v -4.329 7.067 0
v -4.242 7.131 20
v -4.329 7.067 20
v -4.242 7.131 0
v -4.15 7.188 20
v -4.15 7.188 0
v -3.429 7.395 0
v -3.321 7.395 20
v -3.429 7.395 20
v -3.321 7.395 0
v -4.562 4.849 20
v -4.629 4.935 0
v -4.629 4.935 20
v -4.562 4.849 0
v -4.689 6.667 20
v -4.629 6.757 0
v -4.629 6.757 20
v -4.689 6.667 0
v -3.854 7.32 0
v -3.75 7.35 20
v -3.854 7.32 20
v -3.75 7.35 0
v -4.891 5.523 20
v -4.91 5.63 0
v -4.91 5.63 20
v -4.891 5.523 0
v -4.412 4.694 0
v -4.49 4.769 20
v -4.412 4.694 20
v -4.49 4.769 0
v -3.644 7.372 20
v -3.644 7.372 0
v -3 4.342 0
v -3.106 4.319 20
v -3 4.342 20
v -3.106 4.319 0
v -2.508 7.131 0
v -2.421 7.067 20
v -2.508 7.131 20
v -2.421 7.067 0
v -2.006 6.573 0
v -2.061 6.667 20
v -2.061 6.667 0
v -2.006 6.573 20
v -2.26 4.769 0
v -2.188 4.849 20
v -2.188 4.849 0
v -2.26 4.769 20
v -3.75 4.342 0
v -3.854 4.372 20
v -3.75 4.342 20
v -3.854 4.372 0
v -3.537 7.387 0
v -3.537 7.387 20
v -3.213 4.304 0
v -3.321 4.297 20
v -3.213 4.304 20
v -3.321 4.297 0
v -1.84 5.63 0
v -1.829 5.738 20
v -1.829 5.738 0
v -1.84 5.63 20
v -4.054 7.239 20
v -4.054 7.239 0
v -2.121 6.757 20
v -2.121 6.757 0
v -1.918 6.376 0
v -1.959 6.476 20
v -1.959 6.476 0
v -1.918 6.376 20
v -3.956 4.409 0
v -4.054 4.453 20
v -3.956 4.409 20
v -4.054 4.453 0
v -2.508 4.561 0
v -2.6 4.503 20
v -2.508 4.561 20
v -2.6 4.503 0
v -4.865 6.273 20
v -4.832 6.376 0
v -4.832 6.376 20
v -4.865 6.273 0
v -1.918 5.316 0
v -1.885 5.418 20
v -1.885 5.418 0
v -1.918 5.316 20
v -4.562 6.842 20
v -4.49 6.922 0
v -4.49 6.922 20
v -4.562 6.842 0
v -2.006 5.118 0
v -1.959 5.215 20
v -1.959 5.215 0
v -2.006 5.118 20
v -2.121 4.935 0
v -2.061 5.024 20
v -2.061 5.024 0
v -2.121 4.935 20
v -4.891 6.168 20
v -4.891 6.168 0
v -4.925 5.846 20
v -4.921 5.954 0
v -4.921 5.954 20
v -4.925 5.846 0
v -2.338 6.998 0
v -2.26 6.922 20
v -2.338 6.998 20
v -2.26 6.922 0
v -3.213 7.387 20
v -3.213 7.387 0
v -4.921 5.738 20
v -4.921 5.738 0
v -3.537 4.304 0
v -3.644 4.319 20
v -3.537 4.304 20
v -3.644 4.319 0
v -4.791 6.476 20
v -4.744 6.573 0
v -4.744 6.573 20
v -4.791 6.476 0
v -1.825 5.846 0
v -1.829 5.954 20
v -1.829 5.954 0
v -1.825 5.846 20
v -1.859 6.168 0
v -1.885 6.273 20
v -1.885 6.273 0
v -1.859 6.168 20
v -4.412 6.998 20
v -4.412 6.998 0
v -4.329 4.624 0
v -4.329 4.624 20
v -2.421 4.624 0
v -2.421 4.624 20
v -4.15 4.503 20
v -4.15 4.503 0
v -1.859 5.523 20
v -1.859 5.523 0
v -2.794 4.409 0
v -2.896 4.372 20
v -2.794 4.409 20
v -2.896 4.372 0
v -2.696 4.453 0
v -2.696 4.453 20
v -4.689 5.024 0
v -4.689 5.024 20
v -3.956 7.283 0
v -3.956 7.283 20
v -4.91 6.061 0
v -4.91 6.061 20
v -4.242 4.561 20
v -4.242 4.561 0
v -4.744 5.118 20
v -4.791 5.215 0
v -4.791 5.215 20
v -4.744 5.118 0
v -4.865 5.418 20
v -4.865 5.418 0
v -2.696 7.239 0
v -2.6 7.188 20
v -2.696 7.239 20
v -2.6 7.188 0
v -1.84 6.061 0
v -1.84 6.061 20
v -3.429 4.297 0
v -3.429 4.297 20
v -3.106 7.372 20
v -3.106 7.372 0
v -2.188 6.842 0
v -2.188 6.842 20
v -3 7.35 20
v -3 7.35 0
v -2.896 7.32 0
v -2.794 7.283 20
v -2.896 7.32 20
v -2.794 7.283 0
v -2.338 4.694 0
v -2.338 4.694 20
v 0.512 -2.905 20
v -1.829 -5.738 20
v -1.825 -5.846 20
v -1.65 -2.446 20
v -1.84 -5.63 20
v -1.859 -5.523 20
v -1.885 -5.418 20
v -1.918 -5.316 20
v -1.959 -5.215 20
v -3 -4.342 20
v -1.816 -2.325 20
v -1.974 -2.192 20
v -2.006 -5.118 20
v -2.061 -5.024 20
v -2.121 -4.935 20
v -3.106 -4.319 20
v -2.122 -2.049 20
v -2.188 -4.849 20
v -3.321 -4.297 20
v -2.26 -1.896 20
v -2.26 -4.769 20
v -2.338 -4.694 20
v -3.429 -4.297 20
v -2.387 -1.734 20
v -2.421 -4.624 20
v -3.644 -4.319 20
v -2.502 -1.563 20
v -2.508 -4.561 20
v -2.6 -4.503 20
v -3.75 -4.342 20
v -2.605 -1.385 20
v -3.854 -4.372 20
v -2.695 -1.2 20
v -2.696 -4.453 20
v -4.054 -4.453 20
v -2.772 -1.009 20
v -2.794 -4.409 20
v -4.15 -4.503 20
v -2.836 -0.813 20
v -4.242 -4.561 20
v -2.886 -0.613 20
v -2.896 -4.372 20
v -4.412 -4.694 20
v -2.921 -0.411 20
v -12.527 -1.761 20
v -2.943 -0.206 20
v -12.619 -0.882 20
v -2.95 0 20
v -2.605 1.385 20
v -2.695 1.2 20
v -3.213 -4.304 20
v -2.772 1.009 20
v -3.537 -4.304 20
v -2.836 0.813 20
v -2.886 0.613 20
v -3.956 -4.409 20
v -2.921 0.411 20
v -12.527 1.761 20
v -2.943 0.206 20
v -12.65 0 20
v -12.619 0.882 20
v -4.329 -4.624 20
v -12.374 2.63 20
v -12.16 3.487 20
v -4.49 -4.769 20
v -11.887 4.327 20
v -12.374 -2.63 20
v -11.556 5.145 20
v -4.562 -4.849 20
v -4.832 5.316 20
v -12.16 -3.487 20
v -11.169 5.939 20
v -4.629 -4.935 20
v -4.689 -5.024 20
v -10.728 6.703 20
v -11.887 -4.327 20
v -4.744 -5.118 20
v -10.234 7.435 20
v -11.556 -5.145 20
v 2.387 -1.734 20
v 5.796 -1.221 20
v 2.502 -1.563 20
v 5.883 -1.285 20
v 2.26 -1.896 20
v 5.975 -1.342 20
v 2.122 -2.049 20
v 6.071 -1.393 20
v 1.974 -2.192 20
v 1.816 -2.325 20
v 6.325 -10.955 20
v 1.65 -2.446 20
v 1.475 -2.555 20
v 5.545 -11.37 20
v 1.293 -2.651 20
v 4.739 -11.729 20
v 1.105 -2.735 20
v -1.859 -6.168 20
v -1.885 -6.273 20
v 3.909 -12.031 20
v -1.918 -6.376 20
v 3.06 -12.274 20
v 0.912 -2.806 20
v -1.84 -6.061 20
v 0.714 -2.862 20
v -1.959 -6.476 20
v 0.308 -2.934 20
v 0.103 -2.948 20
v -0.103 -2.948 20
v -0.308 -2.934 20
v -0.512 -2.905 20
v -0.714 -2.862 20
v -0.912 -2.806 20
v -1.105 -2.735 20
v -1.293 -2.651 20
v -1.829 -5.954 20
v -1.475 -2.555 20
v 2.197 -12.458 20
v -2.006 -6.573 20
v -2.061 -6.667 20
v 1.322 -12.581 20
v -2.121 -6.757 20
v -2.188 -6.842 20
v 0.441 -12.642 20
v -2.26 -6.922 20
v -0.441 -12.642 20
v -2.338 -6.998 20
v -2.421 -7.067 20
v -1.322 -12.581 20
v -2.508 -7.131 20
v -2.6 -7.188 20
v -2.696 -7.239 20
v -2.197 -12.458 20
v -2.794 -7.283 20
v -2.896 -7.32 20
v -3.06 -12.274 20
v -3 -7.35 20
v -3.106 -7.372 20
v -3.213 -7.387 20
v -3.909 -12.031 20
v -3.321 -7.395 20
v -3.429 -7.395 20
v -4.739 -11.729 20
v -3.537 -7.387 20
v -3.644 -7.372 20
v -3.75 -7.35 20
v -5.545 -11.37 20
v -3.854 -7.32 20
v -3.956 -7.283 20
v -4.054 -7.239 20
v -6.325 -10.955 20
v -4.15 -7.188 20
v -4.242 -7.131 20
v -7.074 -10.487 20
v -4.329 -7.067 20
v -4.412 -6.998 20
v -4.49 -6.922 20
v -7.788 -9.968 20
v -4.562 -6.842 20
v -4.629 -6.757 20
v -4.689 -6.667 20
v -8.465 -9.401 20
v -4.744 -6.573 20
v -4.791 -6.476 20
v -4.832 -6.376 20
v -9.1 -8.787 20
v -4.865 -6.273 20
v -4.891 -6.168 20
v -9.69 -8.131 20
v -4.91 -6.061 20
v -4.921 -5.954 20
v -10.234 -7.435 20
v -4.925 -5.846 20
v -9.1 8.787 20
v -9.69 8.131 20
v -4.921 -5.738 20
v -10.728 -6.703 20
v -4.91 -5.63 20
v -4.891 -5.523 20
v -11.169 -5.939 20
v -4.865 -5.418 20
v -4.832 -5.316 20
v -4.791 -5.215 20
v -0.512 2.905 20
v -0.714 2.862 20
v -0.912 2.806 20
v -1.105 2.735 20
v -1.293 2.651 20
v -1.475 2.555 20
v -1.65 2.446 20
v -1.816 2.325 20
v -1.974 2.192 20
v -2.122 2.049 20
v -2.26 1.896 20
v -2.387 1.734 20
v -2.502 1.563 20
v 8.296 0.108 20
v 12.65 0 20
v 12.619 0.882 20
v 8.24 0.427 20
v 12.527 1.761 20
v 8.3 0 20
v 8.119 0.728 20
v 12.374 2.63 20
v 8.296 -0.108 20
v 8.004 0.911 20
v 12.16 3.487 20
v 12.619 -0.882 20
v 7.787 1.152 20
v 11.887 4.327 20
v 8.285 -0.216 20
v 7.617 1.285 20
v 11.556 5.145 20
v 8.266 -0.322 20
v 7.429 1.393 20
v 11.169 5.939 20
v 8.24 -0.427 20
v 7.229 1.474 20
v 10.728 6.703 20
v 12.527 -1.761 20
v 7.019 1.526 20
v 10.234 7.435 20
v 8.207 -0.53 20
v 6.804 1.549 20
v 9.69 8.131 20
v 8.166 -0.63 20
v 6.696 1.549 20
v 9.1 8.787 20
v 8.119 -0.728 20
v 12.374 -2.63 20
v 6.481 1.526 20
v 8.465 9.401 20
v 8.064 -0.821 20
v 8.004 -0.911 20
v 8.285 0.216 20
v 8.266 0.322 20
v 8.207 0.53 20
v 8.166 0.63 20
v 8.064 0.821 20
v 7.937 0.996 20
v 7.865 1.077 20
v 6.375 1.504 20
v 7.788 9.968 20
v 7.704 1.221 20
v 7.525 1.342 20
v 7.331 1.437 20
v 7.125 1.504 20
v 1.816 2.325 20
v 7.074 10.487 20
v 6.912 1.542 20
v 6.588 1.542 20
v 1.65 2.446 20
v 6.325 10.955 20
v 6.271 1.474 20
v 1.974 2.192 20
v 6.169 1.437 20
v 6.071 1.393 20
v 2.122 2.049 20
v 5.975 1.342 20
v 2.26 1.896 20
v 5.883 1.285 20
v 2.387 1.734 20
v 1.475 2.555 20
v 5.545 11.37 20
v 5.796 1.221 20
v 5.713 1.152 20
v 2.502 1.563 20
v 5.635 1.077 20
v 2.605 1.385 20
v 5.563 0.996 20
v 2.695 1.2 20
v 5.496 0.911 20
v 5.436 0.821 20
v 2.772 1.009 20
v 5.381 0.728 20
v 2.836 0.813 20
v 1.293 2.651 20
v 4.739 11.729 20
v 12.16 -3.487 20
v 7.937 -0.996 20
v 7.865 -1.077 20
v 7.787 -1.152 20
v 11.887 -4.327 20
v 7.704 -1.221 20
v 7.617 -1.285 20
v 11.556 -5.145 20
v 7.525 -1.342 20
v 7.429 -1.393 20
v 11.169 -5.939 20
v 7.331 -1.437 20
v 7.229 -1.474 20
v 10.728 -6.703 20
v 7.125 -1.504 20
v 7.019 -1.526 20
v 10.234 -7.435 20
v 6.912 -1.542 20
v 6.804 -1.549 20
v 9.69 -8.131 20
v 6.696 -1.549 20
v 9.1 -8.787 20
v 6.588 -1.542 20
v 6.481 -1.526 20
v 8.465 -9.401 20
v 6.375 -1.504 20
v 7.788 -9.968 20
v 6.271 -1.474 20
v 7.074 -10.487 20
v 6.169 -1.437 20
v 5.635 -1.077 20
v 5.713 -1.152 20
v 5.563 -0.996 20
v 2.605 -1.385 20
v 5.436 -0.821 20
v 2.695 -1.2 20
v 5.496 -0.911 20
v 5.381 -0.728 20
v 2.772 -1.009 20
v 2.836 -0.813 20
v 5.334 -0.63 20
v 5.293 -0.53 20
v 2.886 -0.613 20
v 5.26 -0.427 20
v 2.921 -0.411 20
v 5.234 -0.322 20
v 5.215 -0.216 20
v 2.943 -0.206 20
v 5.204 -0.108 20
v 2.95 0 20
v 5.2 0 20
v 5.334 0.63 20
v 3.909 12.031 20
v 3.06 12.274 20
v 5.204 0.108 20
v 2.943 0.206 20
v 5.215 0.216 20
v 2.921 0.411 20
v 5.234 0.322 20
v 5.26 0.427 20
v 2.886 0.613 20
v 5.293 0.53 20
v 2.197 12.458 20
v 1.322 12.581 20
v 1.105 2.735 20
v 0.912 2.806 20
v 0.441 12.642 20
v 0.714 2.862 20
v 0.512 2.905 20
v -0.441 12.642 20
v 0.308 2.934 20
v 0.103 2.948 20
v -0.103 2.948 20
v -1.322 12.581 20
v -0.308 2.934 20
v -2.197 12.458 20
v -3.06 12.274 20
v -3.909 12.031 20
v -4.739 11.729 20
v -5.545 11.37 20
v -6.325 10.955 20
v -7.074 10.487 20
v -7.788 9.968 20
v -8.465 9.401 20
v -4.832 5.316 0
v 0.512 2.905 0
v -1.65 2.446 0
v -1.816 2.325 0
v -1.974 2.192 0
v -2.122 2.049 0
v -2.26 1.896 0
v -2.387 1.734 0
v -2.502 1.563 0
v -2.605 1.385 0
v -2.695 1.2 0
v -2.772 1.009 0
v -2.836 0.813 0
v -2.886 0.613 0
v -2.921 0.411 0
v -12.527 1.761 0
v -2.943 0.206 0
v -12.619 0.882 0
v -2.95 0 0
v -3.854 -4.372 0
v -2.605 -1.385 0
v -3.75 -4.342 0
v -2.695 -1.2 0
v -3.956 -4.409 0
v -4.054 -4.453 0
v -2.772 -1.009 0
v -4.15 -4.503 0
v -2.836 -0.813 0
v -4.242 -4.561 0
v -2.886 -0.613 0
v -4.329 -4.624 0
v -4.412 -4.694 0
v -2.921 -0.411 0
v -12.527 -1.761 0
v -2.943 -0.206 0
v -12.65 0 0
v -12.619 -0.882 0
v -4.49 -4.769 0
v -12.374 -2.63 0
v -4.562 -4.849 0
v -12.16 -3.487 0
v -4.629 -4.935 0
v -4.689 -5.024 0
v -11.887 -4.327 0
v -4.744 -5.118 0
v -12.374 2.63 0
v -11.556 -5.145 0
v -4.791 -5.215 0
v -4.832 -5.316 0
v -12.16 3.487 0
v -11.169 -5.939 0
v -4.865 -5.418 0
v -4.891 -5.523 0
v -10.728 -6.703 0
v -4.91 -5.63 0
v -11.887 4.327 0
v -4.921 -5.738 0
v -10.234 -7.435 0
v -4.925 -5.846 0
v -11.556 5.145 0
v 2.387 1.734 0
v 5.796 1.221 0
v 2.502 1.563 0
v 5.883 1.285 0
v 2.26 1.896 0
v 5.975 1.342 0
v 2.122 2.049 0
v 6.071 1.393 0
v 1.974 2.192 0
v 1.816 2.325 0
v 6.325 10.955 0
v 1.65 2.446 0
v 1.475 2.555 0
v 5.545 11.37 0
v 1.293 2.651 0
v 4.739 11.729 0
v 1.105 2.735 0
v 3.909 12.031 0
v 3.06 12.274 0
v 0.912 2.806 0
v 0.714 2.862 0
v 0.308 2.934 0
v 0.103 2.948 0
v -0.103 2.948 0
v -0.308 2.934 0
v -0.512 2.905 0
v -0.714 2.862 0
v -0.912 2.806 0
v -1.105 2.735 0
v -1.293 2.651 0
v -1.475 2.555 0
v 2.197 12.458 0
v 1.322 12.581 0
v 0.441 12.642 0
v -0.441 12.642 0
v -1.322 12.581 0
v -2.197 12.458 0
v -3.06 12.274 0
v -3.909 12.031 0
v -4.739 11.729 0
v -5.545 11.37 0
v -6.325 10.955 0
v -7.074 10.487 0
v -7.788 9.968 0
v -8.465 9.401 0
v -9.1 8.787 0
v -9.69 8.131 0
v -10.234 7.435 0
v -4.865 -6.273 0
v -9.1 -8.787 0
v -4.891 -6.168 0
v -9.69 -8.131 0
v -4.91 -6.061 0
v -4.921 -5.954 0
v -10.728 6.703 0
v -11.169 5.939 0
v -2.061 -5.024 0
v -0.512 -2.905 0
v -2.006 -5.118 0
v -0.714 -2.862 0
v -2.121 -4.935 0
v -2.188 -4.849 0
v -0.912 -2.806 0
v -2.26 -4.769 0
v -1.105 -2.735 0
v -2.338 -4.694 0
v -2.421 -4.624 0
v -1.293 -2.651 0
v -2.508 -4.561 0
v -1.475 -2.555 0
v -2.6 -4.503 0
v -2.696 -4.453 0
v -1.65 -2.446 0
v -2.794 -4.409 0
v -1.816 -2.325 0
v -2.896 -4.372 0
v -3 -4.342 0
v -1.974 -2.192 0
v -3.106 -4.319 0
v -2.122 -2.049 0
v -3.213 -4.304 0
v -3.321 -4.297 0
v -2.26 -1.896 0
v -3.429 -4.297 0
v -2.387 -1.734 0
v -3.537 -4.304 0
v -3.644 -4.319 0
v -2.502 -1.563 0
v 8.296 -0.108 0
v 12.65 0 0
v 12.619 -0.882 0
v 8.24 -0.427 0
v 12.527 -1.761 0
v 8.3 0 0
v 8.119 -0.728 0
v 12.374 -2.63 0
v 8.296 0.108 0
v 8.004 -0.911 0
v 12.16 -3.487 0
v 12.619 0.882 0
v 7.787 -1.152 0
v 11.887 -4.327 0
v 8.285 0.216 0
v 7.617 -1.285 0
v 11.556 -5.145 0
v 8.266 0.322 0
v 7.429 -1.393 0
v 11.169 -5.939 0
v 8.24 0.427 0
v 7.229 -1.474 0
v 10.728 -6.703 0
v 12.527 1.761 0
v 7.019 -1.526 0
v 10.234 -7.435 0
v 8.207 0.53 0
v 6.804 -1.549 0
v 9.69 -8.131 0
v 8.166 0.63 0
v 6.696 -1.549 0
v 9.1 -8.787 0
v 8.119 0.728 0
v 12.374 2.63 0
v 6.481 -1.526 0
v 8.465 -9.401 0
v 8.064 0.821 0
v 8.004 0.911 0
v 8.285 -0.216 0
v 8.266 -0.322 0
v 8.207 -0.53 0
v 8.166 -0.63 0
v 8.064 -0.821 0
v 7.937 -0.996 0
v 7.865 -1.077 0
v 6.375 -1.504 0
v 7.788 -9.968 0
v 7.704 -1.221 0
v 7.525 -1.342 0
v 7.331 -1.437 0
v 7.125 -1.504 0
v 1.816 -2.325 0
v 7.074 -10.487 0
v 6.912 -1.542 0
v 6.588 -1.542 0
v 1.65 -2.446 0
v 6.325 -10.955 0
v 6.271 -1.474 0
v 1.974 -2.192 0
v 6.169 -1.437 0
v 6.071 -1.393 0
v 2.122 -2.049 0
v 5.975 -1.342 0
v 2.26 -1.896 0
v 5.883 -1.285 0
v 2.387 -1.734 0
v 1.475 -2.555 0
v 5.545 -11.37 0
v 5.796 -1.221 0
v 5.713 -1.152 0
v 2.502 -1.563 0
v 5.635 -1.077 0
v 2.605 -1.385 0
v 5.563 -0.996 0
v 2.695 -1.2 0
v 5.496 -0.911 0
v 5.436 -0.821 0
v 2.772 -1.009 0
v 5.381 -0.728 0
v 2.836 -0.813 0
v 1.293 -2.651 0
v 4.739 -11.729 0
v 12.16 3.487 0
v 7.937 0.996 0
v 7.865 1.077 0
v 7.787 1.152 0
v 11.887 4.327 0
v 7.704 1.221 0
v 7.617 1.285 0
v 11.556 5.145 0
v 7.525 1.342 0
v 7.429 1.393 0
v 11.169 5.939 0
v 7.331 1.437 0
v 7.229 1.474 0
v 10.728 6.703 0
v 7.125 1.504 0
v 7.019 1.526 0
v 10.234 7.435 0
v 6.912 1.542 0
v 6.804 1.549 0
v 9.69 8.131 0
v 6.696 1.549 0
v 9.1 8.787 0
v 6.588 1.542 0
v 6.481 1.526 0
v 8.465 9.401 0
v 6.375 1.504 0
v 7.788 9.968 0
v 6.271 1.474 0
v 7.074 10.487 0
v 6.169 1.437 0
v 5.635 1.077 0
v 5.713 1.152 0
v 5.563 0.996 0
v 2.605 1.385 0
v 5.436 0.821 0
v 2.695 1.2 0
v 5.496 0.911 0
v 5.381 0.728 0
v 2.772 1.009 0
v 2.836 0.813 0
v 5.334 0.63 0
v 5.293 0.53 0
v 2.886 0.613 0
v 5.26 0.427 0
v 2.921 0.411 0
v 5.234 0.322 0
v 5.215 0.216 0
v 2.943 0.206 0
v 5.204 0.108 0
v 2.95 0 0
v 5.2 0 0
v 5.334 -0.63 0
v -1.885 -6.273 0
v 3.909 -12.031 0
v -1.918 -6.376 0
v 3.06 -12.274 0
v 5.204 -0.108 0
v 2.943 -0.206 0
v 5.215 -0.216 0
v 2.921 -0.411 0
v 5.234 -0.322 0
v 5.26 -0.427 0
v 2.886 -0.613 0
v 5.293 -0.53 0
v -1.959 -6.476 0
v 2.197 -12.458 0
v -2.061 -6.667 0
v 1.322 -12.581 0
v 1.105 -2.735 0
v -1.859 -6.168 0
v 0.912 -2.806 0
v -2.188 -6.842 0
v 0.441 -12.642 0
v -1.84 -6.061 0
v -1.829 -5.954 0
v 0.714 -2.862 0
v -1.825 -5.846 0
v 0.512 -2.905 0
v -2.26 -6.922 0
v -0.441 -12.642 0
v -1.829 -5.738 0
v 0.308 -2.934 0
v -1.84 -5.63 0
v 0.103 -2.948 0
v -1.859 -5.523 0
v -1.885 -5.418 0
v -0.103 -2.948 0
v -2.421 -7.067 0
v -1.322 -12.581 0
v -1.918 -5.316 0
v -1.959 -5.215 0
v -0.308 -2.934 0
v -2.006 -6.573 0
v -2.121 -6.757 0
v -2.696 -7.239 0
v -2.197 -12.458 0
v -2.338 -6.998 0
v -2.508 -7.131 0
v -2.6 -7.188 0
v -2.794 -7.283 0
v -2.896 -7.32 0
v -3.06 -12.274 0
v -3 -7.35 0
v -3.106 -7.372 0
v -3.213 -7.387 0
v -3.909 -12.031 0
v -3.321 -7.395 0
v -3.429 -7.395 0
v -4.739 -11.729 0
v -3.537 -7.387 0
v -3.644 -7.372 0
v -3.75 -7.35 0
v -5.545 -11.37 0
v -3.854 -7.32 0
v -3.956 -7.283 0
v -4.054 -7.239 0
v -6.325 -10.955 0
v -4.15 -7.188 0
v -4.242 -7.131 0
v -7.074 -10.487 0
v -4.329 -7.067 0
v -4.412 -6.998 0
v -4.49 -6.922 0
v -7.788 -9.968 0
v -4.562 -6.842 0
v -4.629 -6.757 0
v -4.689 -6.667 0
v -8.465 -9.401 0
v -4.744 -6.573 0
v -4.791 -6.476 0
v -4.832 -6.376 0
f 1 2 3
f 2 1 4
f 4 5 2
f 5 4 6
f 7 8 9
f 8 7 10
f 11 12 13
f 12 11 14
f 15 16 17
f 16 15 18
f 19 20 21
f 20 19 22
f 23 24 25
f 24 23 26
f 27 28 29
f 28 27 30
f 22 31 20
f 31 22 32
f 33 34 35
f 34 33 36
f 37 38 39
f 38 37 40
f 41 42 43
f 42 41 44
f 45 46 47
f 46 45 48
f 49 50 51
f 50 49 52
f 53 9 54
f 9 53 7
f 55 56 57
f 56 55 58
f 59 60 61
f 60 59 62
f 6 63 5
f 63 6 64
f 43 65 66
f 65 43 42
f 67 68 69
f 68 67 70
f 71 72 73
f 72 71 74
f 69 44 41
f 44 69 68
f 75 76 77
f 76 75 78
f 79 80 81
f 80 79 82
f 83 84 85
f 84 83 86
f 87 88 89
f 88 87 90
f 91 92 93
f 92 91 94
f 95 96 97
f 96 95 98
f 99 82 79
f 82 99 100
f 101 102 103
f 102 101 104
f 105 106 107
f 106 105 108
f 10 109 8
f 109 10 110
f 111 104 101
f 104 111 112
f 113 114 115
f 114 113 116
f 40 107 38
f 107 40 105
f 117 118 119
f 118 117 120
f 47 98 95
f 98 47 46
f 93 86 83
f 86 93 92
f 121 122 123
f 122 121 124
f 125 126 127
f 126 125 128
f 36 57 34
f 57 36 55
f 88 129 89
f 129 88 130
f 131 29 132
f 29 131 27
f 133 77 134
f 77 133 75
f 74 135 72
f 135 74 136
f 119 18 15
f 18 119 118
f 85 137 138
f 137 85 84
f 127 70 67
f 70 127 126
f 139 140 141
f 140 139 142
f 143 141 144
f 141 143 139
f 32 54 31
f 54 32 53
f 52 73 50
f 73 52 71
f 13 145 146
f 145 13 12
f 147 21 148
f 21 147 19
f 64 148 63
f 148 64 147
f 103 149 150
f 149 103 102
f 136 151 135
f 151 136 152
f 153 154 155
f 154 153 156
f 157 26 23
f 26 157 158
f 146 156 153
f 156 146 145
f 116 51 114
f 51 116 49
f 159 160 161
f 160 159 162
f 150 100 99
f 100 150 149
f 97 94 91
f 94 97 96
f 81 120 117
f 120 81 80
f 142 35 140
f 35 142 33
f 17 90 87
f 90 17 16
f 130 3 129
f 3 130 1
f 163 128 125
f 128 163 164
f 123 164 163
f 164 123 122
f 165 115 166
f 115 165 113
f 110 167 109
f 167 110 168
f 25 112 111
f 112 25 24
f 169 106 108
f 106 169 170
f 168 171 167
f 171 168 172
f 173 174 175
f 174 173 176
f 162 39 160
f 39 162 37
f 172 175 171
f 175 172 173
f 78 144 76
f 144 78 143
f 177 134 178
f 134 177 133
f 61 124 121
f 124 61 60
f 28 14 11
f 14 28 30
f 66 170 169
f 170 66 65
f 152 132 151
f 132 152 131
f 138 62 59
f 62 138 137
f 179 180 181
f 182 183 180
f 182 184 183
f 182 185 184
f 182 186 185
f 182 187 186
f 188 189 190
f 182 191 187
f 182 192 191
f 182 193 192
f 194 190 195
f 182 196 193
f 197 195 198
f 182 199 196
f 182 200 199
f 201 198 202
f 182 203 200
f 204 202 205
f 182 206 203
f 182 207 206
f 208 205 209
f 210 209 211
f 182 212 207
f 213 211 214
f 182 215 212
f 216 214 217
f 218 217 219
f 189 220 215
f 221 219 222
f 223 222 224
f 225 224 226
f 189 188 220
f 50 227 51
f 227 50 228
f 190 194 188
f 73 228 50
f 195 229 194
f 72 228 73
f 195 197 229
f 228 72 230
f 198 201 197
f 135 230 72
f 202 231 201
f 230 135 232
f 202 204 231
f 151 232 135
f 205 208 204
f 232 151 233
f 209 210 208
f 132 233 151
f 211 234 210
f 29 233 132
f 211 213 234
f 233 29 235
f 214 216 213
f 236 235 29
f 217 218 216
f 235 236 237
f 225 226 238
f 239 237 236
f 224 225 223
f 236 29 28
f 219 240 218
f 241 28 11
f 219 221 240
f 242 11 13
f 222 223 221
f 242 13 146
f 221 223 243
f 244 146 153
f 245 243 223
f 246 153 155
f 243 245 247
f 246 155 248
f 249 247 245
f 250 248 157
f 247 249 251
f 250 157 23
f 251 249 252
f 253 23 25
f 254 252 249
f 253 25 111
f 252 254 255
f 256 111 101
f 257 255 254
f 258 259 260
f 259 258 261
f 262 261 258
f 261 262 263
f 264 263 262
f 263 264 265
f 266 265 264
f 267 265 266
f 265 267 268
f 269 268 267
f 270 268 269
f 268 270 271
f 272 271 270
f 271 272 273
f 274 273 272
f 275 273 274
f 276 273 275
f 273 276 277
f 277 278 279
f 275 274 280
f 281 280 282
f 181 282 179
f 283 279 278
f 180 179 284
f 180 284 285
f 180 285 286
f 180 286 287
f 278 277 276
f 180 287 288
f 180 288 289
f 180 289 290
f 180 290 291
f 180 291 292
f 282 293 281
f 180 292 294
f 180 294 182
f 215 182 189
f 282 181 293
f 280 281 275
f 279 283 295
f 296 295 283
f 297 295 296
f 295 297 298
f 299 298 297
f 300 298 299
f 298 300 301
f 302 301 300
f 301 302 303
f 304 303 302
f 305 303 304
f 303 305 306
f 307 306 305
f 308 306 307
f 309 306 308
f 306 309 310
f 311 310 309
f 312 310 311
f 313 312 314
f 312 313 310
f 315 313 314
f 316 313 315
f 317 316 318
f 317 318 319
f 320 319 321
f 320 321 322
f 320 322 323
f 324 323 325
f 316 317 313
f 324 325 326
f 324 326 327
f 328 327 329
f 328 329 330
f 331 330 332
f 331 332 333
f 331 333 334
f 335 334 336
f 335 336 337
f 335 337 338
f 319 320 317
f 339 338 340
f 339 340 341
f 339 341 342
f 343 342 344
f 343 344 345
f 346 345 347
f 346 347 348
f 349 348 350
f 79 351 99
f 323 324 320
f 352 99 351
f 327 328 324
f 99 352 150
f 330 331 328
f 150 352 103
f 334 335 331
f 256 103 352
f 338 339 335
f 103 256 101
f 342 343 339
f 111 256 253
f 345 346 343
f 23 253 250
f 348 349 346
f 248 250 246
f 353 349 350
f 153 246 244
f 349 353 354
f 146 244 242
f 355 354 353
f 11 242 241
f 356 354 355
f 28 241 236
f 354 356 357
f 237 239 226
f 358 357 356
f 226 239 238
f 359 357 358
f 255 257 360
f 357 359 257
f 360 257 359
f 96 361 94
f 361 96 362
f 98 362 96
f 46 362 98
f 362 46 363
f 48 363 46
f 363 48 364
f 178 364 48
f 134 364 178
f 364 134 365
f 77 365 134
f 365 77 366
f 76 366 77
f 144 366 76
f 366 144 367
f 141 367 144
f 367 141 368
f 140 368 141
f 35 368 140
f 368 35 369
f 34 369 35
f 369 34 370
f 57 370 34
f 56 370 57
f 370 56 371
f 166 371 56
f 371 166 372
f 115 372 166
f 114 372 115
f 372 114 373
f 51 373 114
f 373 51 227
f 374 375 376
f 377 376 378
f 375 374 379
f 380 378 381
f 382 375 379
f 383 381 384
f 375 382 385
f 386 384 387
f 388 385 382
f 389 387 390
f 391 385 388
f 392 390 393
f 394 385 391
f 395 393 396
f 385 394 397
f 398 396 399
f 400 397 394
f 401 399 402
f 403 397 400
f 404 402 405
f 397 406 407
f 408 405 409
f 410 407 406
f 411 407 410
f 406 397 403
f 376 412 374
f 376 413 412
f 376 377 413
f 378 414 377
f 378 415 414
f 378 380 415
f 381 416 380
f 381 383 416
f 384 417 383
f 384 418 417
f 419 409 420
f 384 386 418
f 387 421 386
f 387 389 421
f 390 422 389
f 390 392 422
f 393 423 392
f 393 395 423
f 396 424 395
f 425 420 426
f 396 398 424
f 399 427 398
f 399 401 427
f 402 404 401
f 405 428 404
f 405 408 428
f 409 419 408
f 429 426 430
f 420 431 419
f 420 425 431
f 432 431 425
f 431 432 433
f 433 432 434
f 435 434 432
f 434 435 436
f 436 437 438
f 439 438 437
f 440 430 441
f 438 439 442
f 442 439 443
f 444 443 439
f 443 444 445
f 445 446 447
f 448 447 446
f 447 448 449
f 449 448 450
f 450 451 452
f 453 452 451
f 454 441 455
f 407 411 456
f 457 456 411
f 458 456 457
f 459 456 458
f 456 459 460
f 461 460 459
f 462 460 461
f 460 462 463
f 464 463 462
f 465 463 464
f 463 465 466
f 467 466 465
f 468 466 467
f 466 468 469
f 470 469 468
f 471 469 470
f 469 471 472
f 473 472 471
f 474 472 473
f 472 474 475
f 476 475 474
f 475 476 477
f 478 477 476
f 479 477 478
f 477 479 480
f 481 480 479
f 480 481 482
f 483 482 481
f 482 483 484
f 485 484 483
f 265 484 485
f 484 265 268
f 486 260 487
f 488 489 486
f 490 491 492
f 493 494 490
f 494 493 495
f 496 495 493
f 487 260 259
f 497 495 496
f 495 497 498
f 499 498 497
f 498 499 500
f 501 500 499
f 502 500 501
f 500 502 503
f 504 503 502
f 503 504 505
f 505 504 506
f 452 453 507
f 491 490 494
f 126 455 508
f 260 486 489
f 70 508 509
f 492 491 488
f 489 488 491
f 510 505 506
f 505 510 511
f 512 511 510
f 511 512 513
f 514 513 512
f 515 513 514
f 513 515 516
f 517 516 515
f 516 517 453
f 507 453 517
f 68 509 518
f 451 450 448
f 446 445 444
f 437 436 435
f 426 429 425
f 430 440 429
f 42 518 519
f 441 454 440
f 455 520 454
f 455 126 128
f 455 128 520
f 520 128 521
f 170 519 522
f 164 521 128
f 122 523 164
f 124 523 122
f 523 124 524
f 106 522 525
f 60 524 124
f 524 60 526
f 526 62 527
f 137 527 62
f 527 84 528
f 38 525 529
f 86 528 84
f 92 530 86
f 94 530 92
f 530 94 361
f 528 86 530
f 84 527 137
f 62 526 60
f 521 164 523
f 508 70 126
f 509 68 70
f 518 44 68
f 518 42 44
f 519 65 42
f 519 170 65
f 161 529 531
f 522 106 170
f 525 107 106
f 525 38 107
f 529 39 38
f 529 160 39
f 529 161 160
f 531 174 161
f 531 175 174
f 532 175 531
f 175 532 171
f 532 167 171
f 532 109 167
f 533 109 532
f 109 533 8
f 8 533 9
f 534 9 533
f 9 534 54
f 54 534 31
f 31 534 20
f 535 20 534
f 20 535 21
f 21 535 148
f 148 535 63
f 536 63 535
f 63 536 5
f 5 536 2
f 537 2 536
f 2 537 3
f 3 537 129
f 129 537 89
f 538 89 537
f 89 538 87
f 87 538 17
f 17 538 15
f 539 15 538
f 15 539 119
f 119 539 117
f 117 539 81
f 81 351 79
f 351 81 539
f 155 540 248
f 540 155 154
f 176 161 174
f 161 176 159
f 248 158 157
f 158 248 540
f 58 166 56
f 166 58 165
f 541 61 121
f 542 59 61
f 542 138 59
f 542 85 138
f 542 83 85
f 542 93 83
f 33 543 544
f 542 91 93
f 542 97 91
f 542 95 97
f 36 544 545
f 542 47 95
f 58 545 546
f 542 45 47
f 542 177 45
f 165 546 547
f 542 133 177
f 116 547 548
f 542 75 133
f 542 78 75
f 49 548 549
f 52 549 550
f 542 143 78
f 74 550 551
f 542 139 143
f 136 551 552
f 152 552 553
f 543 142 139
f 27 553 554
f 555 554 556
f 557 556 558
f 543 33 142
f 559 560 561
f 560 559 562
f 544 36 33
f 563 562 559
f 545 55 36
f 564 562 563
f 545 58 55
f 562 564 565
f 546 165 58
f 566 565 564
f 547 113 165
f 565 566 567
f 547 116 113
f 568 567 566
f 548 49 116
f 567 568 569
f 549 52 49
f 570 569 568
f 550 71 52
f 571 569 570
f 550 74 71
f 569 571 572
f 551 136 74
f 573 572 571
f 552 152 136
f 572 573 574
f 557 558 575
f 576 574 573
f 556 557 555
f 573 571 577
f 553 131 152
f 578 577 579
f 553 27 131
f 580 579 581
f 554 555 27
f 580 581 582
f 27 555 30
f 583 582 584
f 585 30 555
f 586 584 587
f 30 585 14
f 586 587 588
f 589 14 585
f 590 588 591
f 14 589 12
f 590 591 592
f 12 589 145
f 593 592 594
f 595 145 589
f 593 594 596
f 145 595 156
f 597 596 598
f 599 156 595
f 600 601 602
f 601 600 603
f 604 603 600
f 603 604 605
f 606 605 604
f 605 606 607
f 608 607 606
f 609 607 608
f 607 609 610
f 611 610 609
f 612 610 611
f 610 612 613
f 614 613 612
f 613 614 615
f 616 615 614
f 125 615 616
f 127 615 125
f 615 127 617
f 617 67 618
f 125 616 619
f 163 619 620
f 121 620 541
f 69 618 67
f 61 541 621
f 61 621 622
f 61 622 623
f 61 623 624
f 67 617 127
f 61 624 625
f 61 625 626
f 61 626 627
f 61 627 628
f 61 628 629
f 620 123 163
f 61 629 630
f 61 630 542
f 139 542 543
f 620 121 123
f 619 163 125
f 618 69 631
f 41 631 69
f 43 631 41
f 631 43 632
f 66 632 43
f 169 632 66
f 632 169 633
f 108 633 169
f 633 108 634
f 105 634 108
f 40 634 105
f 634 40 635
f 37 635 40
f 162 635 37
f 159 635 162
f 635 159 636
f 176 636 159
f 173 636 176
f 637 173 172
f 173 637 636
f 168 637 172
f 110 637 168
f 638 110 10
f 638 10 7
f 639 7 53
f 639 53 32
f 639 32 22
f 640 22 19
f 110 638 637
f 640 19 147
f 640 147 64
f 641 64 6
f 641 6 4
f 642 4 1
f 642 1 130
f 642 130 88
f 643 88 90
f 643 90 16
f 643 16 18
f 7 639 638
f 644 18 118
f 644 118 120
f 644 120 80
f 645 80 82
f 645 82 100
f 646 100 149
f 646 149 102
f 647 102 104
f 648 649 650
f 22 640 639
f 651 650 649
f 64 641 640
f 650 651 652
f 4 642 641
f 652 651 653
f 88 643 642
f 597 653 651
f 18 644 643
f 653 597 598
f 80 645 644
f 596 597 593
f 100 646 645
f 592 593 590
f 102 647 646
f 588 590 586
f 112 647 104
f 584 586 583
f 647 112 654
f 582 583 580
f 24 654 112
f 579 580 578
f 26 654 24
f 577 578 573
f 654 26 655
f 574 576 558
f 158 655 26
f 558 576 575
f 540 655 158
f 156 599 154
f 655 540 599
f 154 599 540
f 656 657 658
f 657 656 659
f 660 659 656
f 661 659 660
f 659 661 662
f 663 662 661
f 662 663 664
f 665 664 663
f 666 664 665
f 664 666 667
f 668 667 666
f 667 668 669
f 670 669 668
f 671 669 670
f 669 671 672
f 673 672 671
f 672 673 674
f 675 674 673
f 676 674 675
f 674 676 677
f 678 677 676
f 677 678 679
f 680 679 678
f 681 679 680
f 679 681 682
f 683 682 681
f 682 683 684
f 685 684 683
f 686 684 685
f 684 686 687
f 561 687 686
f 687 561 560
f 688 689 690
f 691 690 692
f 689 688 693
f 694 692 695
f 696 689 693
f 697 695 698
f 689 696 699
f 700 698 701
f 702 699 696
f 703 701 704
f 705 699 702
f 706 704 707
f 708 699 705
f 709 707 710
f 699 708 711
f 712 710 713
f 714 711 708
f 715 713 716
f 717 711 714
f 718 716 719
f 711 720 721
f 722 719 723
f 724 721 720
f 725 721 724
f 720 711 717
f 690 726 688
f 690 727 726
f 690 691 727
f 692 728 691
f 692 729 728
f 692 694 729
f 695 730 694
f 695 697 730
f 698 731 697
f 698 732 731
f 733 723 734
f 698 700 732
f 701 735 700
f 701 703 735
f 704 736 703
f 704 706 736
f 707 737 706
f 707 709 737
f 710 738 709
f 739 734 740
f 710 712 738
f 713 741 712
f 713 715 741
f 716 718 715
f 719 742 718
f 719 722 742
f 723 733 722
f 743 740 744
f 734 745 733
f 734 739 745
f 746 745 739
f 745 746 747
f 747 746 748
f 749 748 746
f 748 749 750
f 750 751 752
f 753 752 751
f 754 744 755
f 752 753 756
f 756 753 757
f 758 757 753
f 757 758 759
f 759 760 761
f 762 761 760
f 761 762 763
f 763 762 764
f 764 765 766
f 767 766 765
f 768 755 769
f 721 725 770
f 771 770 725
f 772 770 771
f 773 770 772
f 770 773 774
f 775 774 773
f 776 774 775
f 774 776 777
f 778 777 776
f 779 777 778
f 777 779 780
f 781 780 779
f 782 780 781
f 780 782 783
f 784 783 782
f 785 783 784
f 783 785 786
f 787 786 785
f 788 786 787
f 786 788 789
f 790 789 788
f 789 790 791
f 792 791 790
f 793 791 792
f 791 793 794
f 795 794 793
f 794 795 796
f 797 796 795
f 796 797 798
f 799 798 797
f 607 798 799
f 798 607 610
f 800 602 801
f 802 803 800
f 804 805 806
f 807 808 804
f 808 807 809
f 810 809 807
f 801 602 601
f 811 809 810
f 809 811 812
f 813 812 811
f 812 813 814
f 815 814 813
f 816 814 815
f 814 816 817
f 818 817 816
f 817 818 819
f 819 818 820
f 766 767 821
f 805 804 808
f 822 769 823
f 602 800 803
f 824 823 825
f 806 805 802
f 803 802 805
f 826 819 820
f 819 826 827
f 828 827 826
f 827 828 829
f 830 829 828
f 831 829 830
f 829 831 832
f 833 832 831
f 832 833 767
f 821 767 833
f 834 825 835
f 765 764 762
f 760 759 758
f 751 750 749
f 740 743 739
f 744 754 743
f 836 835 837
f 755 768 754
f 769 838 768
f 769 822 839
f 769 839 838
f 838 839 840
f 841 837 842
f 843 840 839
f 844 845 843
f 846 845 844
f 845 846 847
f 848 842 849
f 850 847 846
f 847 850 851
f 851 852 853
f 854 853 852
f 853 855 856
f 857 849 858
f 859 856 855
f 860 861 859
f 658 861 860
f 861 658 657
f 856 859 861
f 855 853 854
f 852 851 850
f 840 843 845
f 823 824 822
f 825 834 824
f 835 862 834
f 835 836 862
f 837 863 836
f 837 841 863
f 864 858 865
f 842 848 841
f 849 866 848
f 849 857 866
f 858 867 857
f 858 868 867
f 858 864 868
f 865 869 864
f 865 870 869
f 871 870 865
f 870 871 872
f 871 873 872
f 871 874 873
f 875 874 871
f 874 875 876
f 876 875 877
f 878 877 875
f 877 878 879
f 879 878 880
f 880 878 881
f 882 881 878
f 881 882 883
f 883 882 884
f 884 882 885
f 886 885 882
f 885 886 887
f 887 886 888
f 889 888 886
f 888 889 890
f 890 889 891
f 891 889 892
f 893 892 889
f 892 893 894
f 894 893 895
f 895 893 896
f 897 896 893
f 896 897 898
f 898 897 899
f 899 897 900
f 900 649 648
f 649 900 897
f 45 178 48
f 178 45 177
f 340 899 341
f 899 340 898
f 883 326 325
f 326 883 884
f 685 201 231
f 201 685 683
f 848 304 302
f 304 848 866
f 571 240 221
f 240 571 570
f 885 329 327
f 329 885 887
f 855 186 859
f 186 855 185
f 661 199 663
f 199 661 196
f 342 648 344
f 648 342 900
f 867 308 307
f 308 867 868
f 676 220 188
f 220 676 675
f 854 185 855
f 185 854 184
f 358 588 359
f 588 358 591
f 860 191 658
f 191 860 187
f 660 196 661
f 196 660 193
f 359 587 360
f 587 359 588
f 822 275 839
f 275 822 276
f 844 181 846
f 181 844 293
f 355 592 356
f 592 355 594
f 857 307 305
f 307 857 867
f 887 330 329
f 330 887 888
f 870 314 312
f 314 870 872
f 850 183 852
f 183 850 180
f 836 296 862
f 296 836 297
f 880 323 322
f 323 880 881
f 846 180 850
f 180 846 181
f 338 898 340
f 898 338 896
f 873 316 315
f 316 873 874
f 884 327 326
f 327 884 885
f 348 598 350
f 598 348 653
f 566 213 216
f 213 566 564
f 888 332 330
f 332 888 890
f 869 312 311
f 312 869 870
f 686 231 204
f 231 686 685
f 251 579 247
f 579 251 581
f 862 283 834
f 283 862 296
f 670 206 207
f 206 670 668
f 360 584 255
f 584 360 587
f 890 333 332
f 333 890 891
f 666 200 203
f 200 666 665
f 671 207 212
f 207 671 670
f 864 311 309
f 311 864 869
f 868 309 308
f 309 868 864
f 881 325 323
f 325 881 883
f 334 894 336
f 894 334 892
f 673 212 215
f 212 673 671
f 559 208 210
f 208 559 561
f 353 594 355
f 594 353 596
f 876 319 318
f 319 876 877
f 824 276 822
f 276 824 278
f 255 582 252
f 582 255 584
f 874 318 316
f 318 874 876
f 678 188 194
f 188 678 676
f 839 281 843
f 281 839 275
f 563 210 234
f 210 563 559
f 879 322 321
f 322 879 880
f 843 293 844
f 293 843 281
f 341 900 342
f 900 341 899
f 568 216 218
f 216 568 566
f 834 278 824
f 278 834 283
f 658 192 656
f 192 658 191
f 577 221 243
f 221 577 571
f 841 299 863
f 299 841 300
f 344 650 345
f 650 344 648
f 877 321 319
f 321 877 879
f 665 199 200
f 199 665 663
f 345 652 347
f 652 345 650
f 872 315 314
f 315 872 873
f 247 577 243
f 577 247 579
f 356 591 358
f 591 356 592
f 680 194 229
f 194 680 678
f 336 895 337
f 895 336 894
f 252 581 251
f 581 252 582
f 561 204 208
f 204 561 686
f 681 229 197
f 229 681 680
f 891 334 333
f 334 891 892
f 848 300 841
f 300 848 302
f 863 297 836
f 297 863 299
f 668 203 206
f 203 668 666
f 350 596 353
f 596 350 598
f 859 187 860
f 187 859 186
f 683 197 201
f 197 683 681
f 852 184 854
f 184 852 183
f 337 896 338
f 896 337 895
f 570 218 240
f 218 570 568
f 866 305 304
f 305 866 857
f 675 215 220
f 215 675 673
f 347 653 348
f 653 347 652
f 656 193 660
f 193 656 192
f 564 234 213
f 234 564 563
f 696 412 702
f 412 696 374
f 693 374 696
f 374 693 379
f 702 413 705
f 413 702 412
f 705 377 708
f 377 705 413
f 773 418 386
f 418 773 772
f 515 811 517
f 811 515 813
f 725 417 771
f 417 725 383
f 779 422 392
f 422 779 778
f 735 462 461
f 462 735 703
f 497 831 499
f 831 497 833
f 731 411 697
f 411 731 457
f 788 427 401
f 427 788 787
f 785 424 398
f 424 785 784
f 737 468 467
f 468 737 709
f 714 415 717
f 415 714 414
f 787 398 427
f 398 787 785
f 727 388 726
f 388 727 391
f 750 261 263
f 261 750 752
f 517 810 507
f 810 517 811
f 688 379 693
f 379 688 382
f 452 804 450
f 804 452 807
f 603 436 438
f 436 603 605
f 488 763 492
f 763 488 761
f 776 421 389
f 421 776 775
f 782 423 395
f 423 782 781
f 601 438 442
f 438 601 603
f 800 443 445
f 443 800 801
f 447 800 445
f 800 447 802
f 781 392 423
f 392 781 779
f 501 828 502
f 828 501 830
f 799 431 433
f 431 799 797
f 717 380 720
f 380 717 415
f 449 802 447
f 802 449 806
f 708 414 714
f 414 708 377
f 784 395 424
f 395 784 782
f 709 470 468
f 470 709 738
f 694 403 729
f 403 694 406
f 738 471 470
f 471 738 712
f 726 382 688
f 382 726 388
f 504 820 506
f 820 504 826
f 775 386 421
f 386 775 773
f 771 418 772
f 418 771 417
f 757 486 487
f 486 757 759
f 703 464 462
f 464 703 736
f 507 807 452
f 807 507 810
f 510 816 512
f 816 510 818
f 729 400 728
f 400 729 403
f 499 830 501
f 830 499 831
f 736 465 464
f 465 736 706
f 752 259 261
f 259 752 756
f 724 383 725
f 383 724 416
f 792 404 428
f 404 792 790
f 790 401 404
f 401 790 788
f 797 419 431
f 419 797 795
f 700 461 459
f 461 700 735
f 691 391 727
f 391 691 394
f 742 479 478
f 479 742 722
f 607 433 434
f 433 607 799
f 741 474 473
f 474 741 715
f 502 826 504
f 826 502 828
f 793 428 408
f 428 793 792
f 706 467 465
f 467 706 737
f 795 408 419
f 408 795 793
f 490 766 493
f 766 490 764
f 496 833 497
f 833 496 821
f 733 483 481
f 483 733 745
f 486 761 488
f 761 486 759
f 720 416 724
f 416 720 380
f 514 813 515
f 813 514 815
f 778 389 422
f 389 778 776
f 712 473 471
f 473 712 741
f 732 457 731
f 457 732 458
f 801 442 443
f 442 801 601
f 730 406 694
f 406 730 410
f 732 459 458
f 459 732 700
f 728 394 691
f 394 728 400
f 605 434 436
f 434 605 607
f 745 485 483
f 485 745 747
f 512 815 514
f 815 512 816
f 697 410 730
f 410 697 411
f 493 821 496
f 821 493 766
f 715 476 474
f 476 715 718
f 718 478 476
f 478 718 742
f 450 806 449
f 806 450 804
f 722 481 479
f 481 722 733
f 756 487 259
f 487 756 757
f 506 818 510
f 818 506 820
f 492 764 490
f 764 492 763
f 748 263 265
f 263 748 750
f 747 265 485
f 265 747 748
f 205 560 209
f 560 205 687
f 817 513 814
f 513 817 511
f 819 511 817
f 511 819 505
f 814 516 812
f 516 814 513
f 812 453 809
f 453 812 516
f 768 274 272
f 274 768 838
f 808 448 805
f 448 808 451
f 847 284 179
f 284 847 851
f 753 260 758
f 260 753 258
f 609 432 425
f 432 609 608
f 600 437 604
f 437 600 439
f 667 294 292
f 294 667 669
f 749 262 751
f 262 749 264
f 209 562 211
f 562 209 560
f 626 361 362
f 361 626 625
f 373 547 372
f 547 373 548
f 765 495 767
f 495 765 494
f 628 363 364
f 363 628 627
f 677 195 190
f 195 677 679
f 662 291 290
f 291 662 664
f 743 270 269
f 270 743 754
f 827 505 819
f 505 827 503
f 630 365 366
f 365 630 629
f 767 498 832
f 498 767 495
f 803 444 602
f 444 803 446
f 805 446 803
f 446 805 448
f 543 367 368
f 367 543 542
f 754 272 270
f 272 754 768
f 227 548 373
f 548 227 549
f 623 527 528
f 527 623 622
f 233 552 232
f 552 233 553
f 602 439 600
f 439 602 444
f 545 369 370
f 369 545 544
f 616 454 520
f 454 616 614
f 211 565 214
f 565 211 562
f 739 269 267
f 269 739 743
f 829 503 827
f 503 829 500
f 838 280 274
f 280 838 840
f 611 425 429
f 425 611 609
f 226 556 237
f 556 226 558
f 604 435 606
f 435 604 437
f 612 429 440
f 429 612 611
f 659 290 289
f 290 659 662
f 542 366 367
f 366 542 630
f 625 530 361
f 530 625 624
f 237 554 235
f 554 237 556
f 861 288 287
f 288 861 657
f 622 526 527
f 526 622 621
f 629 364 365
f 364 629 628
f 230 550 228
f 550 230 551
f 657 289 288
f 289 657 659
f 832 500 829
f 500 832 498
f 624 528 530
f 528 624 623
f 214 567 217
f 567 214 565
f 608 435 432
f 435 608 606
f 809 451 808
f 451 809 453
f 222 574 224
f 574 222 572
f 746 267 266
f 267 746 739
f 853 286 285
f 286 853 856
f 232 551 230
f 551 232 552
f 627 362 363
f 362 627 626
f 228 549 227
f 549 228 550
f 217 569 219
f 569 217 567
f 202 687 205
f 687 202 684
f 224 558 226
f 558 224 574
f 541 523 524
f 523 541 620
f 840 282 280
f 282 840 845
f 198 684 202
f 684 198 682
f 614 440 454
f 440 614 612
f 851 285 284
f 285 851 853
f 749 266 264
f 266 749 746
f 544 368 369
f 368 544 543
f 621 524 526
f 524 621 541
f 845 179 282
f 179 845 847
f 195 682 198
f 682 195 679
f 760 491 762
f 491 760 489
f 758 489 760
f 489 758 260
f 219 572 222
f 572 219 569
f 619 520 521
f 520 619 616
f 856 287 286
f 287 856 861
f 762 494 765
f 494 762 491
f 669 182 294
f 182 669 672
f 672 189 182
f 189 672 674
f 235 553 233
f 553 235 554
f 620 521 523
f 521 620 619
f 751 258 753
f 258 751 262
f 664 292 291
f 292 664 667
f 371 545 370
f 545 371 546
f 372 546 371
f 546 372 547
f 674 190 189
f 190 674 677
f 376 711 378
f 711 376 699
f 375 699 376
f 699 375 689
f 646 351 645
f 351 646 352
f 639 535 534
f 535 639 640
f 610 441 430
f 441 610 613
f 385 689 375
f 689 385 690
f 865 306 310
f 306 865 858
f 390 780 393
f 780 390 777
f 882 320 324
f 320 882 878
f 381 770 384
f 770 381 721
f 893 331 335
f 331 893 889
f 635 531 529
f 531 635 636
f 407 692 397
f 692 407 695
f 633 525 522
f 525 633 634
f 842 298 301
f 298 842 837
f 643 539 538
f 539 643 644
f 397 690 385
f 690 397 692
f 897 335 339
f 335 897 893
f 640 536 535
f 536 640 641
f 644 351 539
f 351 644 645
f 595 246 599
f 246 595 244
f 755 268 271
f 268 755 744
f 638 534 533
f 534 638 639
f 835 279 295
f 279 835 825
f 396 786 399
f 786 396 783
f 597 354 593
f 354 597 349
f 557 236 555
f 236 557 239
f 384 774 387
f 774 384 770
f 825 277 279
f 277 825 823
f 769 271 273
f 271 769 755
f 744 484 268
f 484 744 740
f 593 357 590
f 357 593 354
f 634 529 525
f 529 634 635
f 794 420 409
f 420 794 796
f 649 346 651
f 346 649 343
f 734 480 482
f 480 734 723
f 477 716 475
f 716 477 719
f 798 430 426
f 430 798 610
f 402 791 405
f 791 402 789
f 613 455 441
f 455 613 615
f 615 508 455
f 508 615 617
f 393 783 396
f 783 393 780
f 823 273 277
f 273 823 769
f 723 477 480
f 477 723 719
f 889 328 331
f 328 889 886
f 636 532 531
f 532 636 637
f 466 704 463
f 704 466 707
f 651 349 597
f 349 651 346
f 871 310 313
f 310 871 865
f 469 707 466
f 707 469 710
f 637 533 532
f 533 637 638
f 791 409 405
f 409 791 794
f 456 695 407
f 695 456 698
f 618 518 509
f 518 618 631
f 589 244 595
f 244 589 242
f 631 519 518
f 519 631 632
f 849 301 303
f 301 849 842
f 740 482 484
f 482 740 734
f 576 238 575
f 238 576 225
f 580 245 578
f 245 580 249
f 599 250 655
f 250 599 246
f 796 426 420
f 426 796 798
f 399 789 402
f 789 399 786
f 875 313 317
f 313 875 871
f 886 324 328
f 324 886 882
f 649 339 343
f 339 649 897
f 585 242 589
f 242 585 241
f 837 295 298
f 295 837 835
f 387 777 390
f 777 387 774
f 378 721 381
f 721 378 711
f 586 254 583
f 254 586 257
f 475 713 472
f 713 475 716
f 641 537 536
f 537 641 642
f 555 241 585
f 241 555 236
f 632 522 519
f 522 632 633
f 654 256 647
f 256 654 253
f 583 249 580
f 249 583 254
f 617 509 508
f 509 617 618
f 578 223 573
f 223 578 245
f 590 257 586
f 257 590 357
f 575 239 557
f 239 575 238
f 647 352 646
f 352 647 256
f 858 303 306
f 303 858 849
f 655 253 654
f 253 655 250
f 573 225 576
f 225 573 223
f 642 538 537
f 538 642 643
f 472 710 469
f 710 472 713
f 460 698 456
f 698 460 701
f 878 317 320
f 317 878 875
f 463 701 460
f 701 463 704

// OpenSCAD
// file: inc/configuration.scad
// Copyright (C) 2012 t00tie
// Adapto is licensed under the Creative Commons - GNU GPL license.
// http://creativecommons.org/licenses/GPL/2.0/

//==========================================================================//
// Configuration file for Adapto OpenSCAD files                             //
// Scroll past the definition section to change basic and advanced settings //
//==========================================================================//

//====================//
// Definition Section //
//====================//
// Frame and Walls
// frameX and frameY are the dimensions of the frame material when viewed on end(the end of an extrusion looks roughly like an X)
// frameX is the width of the frame material
// frameY is the height of the frame material
//   x
//  [ ]y
// these are used to find offsets for screw placing so screws meet the (slot in the) middle of the frame
frameX=20;// width of the frame material(alu, wood etc.)
frameY=20;// height of the frame material

// Print the hole_calibration.scad object to dial in the next 6 settings
// Google found http://www.fairburyfastener.com/xdims_metric_nuts.htm
M8=8.4;// diameter of M8 threaded rod
M5=5.3;// diameter of M5 threaded rod
M3=3.4;// diameter of M3 threaded rod
M8nut=13;// diameter of M8 nut flat to flat
M5nut=8;// diameter of M5 nut flat to flat
M3nut=5.6;// diameter of M3 nut flat to flat

M8nutThickness=6.8;// thickness of a standard M8 nut(nylock is 8mm)
M5nutThickness=4.7;// thickness of a standard M5 nut(nylock is 5mm)
M3nutThickness=2.4;// thickness of a standard M3 nut

// Acme Linear Screw and Nut
ACME14=6.5;// diameter of 1/4 inch ACME threaded rod in mm
ACME14nut=12.8;// diameter of ACME 1/4 inch nut flat to flat in mm
ACME14nutThickness=6.5;// thickness of ACME 1/4 inch nut in mm


// Linear Bearings
// format is IDxODxL
lm8uu=[8, 15, 24];
lm10uu=[10, 19, 29];
lm10luu=[10, 19, 55];
lm12uu=[12, 21, 30];

//rotary bearings
// format is IDxODxL
xx623=[3, 10, 4];
MF204=[4, 10, 4];
MF126=[6, 12, 4];
rotaryBearing=xx623;// for readability(can be changed if other bearings are used

//====================//
// Basic Config Items //
//====================//
smoothRod=8;				// diameter of smooth rods in mm
linearBearing=lm8uu;	// change this to the linear bearing you are using from the definitions section
zRod=M5;				// change this to the z threaded rod you are using from the definitions section
zRodnut=M5nut;		// change this to the z nut you are using from the definitions section
zRodnutThickness=M5nutThickness;	// change this to the z nut thickness you are using from the definitions section


//=======================//
// Advanced Config Items //
//=======================//
$fn=90;		// default resolution for parts, decrease if part compiling or stl/gcode is unmanageable
thickness=5;		// thickness of walls etc. in parts
pullyDiameter=12.2;	// GT2-20 toothed section diameter

// center of Z drive rod, relative to Z extrusion center
shaft_offset=[47+5, 15];
x_rod_thickness=20;
length_to_hole=43;
bearing_to_vslot=9.63;
belt_z_space = 16;
rail_separation = belt_z_space + x_rod_thickness + 2; // minimum space between the top and bottom 
tolerance=1;
// main file
module znut(invert=false) {
  $fs=0.1;
  $fa=0.1;
  if (!invert)
  {
    difference() {
      cylinder(d=zRod + 20, h=20);
      #znut_holes();
    }
  }
  else {
    znut_holes();
  }
}
znut();
module znut_holes(rod=5, holes=3) {
  $fs=0.1;
  $fa=0.1;
  if (rod == 5) {
      cylinder(d=M5 + 0.6, h=20);
  } else if (rod == 8) {
      cylinder(d=M8+0.6, h=20);
  }
  for (i = [1:holes+1])
    rotate([0,0,i*(360/holes)])
      if (rod == 5) {
          translate([(3/2)+(5/2)+2.75,0,0]) cylinder(d=M3-0.3, h=20);
      } else if (rod == 8) {
          translate([8,0,0]) cylinder(d=M3-0.3, h=20);
      }
}

include<inc/configuration.scad>
